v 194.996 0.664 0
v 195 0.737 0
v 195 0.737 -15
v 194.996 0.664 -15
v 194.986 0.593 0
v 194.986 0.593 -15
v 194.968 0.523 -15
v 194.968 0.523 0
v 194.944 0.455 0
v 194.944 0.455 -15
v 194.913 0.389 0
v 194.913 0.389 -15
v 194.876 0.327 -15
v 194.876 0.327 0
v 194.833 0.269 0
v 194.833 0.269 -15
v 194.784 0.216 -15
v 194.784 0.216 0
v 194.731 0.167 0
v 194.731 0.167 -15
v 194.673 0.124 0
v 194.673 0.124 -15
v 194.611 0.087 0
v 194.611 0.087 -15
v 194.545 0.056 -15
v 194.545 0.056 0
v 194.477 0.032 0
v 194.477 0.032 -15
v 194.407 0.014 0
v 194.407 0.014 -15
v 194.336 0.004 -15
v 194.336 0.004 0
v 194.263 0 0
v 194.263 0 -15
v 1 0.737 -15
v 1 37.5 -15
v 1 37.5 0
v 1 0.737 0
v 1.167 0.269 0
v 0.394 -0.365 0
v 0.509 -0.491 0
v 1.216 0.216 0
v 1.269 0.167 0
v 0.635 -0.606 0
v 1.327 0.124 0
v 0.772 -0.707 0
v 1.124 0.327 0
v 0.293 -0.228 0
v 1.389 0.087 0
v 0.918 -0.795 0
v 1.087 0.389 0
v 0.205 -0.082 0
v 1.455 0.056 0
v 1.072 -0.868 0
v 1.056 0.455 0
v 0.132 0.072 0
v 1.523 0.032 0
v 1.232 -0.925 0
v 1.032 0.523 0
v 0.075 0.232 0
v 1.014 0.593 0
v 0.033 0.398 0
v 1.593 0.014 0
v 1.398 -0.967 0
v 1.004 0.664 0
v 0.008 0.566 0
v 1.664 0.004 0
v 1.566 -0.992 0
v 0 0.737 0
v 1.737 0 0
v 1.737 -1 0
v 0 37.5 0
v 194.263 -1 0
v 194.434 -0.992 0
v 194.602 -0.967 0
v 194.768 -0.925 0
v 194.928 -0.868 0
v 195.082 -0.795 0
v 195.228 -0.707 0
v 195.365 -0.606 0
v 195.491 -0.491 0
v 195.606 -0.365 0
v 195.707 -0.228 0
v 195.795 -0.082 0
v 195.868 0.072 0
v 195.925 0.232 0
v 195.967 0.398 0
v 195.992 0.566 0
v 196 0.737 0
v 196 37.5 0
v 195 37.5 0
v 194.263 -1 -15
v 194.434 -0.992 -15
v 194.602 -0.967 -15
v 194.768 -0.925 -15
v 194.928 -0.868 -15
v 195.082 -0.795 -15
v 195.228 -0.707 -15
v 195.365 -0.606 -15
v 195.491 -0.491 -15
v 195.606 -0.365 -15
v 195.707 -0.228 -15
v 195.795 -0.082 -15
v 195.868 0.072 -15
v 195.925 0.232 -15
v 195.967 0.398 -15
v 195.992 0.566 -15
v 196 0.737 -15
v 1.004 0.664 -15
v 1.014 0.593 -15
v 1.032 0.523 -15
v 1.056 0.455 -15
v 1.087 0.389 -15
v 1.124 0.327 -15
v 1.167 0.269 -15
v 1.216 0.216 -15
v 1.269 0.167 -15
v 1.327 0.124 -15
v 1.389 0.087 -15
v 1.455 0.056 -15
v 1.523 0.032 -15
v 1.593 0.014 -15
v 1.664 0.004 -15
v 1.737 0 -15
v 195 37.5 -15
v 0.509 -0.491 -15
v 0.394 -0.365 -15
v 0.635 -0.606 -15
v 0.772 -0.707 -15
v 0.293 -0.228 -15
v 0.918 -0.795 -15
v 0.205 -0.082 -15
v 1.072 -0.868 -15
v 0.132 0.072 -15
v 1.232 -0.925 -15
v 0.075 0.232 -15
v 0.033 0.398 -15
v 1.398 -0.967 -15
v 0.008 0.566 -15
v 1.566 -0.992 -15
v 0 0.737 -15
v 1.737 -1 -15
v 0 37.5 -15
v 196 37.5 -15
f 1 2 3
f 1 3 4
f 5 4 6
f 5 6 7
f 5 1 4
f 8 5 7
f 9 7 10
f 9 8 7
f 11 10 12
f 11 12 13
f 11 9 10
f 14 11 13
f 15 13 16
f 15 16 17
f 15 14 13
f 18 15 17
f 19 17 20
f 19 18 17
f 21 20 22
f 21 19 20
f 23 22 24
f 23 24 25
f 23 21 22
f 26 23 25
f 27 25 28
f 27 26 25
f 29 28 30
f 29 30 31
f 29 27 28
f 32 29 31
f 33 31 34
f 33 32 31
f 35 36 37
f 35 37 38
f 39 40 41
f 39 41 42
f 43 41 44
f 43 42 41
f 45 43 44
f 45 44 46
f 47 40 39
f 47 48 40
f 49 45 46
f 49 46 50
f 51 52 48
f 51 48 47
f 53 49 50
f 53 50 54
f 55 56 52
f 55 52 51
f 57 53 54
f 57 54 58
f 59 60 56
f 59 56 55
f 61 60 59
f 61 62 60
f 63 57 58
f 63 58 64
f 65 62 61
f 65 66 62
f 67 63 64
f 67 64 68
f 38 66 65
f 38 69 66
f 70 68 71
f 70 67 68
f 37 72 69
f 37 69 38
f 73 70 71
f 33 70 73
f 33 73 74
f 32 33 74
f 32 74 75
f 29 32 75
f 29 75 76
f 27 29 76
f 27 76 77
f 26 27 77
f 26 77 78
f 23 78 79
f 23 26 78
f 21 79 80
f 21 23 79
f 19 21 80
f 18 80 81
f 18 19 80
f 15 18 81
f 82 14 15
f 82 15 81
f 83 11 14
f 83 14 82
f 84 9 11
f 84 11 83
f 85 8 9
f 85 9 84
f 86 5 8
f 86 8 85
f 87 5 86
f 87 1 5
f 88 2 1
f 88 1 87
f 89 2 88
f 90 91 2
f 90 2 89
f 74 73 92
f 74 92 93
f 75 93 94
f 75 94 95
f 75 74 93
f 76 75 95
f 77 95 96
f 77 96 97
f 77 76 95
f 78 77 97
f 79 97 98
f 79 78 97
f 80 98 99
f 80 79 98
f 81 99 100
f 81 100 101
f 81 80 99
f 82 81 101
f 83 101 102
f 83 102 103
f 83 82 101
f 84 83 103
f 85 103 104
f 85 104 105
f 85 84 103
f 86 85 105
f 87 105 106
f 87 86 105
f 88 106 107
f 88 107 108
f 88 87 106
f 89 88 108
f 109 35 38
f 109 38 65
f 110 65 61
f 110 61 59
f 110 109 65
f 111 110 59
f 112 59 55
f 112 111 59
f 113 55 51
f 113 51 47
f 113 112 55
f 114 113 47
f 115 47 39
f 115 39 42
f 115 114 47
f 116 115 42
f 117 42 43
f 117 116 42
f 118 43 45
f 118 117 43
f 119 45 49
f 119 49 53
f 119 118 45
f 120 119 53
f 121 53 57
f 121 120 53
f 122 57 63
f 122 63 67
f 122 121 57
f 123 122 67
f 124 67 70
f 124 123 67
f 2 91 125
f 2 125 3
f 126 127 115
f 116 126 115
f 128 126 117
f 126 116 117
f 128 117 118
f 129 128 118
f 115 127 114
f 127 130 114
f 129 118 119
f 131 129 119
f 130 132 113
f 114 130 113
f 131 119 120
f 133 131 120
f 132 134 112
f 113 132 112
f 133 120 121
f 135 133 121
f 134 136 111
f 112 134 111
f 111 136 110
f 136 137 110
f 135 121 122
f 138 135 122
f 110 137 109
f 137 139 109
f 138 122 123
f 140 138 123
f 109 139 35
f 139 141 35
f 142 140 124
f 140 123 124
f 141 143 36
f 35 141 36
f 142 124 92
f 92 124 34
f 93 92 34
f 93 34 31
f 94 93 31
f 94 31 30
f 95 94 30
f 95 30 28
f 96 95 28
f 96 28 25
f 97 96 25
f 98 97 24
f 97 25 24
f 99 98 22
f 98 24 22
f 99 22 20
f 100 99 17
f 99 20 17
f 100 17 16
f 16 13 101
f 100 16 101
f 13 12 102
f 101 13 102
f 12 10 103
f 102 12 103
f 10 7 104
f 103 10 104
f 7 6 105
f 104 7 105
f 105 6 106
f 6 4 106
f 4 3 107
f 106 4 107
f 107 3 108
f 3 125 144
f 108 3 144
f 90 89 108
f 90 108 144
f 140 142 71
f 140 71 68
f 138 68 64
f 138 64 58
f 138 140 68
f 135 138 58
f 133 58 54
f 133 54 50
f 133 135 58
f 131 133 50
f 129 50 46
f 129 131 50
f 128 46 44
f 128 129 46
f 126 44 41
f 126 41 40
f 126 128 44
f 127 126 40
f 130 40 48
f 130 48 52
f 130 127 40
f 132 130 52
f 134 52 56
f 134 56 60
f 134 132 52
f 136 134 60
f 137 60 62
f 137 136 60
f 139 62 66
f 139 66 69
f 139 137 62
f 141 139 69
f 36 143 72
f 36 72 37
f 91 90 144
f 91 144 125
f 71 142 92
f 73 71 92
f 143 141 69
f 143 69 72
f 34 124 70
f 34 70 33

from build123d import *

# Parameters (mm, degrees)
SKETCH_1_W                       = 196
SKETCH_1_H                       = 15
SM_BASE_FLANGE_1_DEPTH           = 1
SM_EDGE_FLANGE_1_STRIP_W         = 5.4732
SM_EDGE_FLANGE_1_STRIP_H         = 1
SM_EDGE_FLANGE_1_STRIP_CUT_DEPTH = 15
SM_EDGE_FLANGE_1_DEPTH           = 15
SM_EDGE_FLANGE_2_STRIP_W         = 5.4732
SM_EDGE_FLANGE_2_STRIP_H         = 1
SM_EDGE_FLANGE_2_STRIP_CUT_DEPTH = 15
SM_EDGE_FLANGE_2_DEPTH           = 15


# Sheet-metal steps are written as plain solids
with BuildPart() as part:
    # Sketch 1 → Базовая кромка1 (new body)
    with BuildSketch(Plane(origin=(0, 0, 0), x_dir=(1, 0, 0), z_dir=(0, 1, 0))):
        with Locations((98, 7.5)):
            Rectangle(SKETCH_1_W, SKETCH_1_H)
    extrude(amount=-SM_BASE_FLANGE_1_DEPTH)

    # Ребро-кромка1 strip (across the edge) → Ребро-кромка1 strip cut (cut)
    with BuildSketch(Plane.XY.offset(-15)):
        with Locations((-1, -0.5)):
            Rectangle(SM_EDGE_FLANGE_1_STRIP_W, SM_EDGE_FLANGE_1_STRIP_H)
    extrude(amount=SM_EDGE_FLANGE_1_STRIP_CUT_DEPTH, mode=Mode.SUBTRACT)

    # Ребро-кромка1 section (across the edge) → Ребро-кромка1 (add)
    with BuildSketch(Plane.XY.offset(-15)):
        with BuildLine():
            Line((0, 0.7366), (0, 37.5))
            Line((0, 37.5), (1, 37.5))
            Line((1, 37.5), (1, 0.7366))
            ThreePointArc((1, 0.7366), (1.215745145, 0.215745145), (1.7366, 0))
            Line((1.7366, 0), (1.7366, -1))
            ThreePointArc((1.7366, -1), (0.508638364, -0.491361636), (0, 0.7366))
        make_face()
    extrude(amount=SM_EDGE_FLANGE_1_DEPTH)

    # Ребро-кромка2 strip (across the edge) → Ребро-кромка2 strip cut (cut)
    with BuildSketch(Plane(origin=(196, 0, 0), x_dir=(-1, 0, 0), z_dir=(0, 0, -1))):
        with Locations((-1, -0.5)):
            Rectangle(SM_EDGE_FLANGE_2_STRIP_W, SM_EDGE_FLANGE_2_STRIP_H)
    extrude(amount=SM_EDGE_FLANGE_2_STRIP_CUT_DEPTH, mode=Mode.SUBTRACT)

    # Ребро-кромка2 section (across the edge) → Ребро-кромка2 (add)
    with BuildSketch(Plane(origin=(196, 0, 0), x_dir=(-1, 0, 0), z_dir=(0, 0, -1))):
        with BuildLine():
            Line((0, 0.7366), (0, 37.5))
            Line((0, 37.5), (1, 37.5))
            Line((1, 37.5), (1, 0.7366))
            ThreePointArc((1, 0.7366), (1.215745145, 0.215745145), (1.7366, 0))
            Line((1.7366, 0), (1.7366, -1))
            ThreePointArc((1.7366, -1), (0.508638364, -0.491361636), (0, 0.7366))
        make_face()
    extrude(amount=SM_EDGE_FLANGE_2_DEPTH)


solid = part.part
